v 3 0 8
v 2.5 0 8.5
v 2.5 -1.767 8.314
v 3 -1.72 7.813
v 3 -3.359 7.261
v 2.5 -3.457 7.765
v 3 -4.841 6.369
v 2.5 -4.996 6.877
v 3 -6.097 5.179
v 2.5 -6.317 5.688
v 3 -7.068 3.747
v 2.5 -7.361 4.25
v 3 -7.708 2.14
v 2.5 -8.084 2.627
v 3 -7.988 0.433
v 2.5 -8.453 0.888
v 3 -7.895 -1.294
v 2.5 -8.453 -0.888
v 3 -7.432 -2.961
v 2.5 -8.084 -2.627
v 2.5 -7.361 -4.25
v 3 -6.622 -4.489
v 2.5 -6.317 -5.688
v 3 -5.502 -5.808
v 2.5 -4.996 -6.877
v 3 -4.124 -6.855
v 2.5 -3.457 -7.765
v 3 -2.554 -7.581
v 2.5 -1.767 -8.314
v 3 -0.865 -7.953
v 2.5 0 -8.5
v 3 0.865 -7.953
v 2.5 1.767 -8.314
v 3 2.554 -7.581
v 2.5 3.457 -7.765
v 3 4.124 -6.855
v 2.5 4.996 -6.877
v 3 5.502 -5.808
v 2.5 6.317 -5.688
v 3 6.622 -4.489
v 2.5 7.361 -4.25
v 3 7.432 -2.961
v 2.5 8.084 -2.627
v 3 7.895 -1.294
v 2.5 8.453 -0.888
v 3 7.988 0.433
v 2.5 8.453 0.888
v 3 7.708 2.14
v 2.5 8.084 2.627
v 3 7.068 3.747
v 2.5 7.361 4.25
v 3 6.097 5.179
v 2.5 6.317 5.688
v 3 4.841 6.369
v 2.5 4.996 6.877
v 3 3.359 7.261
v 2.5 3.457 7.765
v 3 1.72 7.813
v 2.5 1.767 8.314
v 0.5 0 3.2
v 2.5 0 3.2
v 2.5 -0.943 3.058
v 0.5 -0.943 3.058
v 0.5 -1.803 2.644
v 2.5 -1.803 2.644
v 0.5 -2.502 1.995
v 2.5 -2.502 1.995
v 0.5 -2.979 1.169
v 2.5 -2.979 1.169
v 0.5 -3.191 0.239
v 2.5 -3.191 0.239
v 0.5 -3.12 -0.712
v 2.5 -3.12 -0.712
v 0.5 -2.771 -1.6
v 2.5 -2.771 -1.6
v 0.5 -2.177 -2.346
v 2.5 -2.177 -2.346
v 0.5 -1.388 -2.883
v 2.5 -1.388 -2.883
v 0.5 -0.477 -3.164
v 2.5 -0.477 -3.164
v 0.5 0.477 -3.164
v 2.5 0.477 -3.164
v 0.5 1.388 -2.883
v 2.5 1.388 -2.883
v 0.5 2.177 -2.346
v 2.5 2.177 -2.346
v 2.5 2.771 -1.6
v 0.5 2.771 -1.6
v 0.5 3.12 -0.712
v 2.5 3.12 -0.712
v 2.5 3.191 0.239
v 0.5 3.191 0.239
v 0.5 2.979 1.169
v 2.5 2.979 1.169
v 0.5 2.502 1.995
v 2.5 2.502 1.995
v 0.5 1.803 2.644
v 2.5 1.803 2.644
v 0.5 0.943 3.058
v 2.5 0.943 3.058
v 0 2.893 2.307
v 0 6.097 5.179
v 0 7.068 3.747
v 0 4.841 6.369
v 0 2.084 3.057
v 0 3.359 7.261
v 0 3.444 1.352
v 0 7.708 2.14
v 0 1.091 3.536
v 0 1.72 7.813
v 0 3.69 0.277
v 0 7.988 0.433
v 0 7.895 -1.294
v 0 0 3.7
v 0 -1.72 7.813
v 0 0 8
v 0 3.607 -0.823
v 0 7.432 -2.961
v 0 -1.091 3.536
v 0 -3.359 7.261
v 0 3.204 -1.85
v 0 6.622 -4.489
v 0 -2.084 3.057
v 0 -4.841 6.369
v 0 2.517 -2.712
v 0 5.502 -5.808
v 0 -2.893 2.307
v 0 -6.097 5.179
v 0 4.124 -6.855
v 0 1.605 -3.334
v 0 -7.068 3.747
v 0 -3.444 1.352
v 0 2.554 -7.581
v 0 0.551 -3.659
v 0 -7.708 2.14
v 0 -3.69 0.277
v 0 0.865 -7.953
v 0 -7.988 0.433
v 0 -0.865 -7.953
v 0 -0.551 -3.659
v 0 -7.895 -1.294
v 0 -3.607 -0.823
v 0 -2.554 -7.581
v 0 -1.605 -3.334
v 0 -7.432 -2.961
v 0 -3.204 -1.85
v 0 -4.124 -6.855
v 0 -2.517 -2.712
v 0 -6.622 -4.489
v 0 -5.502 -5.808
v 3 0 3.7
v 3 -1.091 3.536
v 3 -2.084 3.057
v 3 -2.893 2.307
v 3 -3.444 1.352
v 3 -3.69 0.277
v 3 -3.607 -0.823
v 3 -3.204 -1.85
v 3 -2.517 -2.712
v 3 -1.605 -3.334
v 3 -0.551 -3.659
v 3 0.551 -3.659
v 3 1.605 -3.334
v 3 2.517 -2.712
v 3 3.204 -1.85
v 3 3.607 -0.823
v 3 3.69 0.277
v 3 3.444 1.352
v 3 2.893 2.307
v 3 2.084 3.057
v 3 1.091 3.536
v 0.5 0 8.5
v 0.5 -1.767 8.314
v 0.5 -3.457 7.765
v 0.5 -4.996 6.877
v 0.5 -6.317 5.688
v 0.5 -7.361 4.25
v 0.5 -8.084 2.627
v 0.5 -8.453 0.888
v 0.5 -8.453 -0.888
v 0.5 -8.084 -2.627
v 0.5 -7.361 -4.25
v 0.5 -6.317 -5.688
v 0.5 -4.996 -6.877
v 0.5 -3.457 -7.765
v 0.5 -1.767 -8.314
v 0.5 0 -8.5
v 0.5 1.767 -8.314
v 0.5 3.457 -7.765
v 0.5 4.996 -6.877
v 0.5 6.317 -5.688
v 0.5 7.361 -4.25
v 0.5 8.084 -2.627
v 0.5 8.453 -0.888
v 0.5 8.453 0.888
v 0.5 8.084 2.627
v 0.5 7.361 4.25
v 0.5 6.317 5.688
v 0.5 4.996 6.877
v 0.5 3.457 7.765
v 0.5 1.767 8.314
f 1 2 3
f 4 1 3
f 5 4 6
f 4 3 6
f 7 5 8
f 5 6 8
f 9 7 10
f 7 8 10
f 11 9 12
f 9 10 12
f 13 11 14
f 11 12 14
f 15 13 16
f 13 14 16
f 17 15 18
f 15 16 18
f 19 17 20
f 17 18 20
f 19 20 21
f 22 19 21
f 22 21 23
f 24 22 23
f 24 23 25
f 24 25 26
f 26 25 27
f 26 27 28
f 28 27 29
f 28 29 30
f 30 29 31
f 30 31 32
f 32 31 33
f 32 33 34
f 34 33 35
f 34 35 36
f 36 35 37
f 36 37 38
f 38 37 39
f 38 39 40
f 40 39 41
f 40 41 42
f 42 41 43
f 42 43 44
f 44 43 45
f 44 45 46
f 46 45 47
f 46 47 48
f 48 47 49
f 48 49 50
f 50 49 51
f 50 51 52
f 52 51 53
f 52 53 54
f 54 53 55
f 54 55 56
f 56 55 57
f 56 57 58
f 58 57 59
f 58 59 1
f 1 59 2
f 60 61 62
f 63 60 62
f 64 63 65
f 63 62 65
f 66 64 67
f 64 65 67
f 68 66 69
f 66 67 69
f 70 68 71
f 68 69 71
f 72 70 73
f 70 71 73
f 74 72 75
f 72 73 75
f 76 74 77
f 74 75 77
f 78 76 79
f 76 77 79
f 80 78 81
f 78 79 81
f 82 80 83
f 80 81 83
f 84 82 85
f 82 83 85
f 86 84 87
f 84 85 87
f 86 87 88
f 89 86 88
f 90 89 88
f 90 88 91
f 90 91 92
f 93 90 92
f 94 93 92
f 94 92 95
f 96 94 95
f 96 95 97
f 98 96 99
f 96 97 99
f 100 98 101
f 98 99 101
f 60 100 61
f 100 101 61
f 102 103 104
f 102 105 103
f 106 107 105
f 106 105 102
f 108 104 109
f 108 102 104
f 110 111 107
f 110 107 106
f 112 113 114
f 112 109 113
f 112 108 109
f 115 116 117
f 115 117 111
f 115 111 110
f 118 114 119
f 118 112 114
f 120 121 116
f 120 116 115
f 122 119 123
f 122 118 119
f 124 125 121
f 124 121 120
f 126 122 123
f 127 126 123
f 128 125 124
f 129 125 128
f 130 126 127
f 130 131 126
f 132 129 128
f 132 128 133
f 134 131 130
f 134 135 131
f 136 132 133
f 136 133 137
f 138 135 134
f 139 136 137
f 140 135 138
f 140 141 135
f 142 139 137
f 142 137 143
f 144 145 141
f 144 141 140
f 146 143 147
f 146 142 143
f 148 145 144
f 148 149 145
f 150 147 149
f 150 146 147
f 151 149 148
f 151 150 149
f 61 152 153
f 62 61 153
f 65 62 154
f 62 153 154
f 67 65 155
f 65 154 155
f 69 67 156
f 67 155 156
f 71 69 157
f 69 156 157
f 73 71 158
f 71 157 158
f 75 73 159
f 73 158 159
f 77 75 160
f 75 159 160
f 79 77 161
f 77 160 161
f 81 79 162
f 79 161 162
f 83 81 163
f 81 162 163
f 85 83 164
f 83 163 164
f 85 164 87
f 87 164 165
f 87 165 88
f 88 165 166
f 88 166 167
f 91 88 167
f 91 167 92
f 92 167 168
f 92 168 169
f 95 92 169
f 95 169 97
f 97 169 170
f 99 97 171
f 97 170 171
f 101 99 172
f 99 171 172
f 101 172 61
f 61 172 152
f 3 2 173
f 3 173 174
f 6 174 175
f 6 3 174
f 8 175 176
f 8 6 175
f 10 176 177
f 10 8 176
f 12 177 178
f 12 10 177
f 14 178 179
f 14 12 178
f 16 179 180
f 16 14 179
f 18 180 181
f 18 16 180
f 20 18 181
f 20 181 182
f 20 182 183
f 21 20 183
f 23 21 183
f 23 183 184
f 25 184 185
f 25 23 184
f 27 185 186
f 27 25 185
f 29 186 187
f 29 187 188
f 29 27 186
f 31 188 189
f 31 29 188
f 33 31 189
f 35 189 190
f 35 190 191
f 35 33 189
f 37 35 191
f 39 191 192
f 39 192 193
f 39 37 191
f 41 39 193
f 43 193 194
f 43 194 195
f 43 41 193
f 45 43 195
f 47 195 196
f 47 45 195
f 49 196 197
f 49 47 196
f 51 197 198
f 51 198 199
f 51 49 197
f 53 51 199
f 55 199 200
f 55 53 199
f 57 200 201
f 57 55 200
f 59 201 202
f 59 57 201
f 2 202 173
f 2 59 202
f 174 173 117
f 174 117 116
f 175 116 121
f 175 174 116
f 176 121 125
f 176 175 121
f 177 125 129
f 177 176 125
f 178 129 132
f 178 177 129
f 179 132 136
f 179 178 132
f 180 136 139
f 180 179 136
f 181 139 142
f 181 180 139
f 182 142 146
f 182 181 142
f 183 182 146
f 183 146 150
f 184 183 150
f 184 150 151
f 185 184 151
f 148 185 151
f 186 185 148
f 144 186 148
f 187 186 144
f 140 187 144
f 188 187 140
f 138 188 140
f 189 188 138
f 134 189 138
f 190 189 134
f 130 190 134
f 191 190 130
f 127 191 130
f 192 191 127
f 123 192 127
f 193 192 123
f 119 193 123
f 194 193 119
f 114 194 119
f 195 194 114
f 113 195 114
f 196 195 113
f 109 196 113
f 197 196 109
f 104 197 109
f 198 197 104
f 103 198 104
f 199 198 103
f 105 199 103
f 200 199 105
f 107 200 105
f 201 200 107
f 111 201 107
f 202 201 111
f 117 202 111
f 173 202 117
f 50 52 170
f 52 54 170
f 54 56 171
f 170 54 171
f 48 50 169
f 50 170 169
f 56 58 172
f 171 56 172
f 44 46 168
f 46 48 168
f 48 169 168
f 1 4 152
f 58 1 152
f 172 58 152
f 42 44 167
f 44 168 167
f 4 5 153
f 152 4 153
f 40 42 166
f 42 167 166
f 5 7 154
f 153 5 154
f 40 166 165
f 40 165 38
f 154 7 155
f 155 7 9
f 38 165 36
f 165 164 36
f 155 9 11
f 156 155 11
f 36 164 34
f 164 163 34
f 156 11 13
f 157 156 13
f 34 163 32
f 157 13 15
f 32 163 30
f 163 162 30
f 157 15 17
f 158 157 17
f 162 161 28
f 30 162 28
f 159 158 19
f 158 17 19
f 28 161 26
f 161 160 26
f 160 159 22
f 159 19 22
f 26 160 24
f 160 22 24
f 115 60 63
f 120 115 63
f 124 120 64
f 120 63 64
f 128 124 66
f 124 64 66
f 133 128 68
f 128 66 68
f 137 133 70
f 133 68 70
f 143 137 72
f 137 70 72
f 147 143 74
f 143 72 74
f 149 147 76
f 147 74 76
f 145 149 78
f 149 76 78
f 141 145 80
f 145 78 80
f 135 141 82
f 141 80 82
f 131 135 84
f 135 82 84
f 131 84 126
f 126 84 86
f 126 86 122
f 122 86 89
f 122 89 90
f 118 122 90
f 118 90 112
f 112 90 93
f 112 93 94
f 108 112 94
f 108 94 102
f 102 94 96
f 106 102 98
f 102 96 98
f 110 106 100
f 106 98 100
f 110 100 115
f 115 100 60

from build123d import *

# Parameters (mm, degrees)
ESQUISSE1_W     = 3
ESQUISSE1_H     = 5.3
CHANFREIN1_SIZE = 0.5


with BuildPart() as part:
    # Esquisse1 → Base-Révolution (revolve)
    with BuildSketch(Plane.XY, mode=Mode.PRIVATE) as base_r_volution_sk:
        with Locations((1.5, 5.85)):
            Rectangle(ESQUISSE1_W, ESQUISSE1_H)
    revolve(base_r_volution_sk.sketch.rotate(Axis((0, 0, 0), (1, 0, 0)), 90), axis=Axis((0, 0, 0), (1, 0, 0)))

    # Chanfrein1
    chanfrein1_edges = [part.edges().sort_by_distance(p)[0] for p in [
        (0, 0, -3.2),
        (3, 0, -3.2),
        (3, 0, -8.5),
        (0, 0, -8.5),
    ]]
    chamfer(chanfrein1_edges, length=CHANFREIN1_SIZE)


solid = part.part
